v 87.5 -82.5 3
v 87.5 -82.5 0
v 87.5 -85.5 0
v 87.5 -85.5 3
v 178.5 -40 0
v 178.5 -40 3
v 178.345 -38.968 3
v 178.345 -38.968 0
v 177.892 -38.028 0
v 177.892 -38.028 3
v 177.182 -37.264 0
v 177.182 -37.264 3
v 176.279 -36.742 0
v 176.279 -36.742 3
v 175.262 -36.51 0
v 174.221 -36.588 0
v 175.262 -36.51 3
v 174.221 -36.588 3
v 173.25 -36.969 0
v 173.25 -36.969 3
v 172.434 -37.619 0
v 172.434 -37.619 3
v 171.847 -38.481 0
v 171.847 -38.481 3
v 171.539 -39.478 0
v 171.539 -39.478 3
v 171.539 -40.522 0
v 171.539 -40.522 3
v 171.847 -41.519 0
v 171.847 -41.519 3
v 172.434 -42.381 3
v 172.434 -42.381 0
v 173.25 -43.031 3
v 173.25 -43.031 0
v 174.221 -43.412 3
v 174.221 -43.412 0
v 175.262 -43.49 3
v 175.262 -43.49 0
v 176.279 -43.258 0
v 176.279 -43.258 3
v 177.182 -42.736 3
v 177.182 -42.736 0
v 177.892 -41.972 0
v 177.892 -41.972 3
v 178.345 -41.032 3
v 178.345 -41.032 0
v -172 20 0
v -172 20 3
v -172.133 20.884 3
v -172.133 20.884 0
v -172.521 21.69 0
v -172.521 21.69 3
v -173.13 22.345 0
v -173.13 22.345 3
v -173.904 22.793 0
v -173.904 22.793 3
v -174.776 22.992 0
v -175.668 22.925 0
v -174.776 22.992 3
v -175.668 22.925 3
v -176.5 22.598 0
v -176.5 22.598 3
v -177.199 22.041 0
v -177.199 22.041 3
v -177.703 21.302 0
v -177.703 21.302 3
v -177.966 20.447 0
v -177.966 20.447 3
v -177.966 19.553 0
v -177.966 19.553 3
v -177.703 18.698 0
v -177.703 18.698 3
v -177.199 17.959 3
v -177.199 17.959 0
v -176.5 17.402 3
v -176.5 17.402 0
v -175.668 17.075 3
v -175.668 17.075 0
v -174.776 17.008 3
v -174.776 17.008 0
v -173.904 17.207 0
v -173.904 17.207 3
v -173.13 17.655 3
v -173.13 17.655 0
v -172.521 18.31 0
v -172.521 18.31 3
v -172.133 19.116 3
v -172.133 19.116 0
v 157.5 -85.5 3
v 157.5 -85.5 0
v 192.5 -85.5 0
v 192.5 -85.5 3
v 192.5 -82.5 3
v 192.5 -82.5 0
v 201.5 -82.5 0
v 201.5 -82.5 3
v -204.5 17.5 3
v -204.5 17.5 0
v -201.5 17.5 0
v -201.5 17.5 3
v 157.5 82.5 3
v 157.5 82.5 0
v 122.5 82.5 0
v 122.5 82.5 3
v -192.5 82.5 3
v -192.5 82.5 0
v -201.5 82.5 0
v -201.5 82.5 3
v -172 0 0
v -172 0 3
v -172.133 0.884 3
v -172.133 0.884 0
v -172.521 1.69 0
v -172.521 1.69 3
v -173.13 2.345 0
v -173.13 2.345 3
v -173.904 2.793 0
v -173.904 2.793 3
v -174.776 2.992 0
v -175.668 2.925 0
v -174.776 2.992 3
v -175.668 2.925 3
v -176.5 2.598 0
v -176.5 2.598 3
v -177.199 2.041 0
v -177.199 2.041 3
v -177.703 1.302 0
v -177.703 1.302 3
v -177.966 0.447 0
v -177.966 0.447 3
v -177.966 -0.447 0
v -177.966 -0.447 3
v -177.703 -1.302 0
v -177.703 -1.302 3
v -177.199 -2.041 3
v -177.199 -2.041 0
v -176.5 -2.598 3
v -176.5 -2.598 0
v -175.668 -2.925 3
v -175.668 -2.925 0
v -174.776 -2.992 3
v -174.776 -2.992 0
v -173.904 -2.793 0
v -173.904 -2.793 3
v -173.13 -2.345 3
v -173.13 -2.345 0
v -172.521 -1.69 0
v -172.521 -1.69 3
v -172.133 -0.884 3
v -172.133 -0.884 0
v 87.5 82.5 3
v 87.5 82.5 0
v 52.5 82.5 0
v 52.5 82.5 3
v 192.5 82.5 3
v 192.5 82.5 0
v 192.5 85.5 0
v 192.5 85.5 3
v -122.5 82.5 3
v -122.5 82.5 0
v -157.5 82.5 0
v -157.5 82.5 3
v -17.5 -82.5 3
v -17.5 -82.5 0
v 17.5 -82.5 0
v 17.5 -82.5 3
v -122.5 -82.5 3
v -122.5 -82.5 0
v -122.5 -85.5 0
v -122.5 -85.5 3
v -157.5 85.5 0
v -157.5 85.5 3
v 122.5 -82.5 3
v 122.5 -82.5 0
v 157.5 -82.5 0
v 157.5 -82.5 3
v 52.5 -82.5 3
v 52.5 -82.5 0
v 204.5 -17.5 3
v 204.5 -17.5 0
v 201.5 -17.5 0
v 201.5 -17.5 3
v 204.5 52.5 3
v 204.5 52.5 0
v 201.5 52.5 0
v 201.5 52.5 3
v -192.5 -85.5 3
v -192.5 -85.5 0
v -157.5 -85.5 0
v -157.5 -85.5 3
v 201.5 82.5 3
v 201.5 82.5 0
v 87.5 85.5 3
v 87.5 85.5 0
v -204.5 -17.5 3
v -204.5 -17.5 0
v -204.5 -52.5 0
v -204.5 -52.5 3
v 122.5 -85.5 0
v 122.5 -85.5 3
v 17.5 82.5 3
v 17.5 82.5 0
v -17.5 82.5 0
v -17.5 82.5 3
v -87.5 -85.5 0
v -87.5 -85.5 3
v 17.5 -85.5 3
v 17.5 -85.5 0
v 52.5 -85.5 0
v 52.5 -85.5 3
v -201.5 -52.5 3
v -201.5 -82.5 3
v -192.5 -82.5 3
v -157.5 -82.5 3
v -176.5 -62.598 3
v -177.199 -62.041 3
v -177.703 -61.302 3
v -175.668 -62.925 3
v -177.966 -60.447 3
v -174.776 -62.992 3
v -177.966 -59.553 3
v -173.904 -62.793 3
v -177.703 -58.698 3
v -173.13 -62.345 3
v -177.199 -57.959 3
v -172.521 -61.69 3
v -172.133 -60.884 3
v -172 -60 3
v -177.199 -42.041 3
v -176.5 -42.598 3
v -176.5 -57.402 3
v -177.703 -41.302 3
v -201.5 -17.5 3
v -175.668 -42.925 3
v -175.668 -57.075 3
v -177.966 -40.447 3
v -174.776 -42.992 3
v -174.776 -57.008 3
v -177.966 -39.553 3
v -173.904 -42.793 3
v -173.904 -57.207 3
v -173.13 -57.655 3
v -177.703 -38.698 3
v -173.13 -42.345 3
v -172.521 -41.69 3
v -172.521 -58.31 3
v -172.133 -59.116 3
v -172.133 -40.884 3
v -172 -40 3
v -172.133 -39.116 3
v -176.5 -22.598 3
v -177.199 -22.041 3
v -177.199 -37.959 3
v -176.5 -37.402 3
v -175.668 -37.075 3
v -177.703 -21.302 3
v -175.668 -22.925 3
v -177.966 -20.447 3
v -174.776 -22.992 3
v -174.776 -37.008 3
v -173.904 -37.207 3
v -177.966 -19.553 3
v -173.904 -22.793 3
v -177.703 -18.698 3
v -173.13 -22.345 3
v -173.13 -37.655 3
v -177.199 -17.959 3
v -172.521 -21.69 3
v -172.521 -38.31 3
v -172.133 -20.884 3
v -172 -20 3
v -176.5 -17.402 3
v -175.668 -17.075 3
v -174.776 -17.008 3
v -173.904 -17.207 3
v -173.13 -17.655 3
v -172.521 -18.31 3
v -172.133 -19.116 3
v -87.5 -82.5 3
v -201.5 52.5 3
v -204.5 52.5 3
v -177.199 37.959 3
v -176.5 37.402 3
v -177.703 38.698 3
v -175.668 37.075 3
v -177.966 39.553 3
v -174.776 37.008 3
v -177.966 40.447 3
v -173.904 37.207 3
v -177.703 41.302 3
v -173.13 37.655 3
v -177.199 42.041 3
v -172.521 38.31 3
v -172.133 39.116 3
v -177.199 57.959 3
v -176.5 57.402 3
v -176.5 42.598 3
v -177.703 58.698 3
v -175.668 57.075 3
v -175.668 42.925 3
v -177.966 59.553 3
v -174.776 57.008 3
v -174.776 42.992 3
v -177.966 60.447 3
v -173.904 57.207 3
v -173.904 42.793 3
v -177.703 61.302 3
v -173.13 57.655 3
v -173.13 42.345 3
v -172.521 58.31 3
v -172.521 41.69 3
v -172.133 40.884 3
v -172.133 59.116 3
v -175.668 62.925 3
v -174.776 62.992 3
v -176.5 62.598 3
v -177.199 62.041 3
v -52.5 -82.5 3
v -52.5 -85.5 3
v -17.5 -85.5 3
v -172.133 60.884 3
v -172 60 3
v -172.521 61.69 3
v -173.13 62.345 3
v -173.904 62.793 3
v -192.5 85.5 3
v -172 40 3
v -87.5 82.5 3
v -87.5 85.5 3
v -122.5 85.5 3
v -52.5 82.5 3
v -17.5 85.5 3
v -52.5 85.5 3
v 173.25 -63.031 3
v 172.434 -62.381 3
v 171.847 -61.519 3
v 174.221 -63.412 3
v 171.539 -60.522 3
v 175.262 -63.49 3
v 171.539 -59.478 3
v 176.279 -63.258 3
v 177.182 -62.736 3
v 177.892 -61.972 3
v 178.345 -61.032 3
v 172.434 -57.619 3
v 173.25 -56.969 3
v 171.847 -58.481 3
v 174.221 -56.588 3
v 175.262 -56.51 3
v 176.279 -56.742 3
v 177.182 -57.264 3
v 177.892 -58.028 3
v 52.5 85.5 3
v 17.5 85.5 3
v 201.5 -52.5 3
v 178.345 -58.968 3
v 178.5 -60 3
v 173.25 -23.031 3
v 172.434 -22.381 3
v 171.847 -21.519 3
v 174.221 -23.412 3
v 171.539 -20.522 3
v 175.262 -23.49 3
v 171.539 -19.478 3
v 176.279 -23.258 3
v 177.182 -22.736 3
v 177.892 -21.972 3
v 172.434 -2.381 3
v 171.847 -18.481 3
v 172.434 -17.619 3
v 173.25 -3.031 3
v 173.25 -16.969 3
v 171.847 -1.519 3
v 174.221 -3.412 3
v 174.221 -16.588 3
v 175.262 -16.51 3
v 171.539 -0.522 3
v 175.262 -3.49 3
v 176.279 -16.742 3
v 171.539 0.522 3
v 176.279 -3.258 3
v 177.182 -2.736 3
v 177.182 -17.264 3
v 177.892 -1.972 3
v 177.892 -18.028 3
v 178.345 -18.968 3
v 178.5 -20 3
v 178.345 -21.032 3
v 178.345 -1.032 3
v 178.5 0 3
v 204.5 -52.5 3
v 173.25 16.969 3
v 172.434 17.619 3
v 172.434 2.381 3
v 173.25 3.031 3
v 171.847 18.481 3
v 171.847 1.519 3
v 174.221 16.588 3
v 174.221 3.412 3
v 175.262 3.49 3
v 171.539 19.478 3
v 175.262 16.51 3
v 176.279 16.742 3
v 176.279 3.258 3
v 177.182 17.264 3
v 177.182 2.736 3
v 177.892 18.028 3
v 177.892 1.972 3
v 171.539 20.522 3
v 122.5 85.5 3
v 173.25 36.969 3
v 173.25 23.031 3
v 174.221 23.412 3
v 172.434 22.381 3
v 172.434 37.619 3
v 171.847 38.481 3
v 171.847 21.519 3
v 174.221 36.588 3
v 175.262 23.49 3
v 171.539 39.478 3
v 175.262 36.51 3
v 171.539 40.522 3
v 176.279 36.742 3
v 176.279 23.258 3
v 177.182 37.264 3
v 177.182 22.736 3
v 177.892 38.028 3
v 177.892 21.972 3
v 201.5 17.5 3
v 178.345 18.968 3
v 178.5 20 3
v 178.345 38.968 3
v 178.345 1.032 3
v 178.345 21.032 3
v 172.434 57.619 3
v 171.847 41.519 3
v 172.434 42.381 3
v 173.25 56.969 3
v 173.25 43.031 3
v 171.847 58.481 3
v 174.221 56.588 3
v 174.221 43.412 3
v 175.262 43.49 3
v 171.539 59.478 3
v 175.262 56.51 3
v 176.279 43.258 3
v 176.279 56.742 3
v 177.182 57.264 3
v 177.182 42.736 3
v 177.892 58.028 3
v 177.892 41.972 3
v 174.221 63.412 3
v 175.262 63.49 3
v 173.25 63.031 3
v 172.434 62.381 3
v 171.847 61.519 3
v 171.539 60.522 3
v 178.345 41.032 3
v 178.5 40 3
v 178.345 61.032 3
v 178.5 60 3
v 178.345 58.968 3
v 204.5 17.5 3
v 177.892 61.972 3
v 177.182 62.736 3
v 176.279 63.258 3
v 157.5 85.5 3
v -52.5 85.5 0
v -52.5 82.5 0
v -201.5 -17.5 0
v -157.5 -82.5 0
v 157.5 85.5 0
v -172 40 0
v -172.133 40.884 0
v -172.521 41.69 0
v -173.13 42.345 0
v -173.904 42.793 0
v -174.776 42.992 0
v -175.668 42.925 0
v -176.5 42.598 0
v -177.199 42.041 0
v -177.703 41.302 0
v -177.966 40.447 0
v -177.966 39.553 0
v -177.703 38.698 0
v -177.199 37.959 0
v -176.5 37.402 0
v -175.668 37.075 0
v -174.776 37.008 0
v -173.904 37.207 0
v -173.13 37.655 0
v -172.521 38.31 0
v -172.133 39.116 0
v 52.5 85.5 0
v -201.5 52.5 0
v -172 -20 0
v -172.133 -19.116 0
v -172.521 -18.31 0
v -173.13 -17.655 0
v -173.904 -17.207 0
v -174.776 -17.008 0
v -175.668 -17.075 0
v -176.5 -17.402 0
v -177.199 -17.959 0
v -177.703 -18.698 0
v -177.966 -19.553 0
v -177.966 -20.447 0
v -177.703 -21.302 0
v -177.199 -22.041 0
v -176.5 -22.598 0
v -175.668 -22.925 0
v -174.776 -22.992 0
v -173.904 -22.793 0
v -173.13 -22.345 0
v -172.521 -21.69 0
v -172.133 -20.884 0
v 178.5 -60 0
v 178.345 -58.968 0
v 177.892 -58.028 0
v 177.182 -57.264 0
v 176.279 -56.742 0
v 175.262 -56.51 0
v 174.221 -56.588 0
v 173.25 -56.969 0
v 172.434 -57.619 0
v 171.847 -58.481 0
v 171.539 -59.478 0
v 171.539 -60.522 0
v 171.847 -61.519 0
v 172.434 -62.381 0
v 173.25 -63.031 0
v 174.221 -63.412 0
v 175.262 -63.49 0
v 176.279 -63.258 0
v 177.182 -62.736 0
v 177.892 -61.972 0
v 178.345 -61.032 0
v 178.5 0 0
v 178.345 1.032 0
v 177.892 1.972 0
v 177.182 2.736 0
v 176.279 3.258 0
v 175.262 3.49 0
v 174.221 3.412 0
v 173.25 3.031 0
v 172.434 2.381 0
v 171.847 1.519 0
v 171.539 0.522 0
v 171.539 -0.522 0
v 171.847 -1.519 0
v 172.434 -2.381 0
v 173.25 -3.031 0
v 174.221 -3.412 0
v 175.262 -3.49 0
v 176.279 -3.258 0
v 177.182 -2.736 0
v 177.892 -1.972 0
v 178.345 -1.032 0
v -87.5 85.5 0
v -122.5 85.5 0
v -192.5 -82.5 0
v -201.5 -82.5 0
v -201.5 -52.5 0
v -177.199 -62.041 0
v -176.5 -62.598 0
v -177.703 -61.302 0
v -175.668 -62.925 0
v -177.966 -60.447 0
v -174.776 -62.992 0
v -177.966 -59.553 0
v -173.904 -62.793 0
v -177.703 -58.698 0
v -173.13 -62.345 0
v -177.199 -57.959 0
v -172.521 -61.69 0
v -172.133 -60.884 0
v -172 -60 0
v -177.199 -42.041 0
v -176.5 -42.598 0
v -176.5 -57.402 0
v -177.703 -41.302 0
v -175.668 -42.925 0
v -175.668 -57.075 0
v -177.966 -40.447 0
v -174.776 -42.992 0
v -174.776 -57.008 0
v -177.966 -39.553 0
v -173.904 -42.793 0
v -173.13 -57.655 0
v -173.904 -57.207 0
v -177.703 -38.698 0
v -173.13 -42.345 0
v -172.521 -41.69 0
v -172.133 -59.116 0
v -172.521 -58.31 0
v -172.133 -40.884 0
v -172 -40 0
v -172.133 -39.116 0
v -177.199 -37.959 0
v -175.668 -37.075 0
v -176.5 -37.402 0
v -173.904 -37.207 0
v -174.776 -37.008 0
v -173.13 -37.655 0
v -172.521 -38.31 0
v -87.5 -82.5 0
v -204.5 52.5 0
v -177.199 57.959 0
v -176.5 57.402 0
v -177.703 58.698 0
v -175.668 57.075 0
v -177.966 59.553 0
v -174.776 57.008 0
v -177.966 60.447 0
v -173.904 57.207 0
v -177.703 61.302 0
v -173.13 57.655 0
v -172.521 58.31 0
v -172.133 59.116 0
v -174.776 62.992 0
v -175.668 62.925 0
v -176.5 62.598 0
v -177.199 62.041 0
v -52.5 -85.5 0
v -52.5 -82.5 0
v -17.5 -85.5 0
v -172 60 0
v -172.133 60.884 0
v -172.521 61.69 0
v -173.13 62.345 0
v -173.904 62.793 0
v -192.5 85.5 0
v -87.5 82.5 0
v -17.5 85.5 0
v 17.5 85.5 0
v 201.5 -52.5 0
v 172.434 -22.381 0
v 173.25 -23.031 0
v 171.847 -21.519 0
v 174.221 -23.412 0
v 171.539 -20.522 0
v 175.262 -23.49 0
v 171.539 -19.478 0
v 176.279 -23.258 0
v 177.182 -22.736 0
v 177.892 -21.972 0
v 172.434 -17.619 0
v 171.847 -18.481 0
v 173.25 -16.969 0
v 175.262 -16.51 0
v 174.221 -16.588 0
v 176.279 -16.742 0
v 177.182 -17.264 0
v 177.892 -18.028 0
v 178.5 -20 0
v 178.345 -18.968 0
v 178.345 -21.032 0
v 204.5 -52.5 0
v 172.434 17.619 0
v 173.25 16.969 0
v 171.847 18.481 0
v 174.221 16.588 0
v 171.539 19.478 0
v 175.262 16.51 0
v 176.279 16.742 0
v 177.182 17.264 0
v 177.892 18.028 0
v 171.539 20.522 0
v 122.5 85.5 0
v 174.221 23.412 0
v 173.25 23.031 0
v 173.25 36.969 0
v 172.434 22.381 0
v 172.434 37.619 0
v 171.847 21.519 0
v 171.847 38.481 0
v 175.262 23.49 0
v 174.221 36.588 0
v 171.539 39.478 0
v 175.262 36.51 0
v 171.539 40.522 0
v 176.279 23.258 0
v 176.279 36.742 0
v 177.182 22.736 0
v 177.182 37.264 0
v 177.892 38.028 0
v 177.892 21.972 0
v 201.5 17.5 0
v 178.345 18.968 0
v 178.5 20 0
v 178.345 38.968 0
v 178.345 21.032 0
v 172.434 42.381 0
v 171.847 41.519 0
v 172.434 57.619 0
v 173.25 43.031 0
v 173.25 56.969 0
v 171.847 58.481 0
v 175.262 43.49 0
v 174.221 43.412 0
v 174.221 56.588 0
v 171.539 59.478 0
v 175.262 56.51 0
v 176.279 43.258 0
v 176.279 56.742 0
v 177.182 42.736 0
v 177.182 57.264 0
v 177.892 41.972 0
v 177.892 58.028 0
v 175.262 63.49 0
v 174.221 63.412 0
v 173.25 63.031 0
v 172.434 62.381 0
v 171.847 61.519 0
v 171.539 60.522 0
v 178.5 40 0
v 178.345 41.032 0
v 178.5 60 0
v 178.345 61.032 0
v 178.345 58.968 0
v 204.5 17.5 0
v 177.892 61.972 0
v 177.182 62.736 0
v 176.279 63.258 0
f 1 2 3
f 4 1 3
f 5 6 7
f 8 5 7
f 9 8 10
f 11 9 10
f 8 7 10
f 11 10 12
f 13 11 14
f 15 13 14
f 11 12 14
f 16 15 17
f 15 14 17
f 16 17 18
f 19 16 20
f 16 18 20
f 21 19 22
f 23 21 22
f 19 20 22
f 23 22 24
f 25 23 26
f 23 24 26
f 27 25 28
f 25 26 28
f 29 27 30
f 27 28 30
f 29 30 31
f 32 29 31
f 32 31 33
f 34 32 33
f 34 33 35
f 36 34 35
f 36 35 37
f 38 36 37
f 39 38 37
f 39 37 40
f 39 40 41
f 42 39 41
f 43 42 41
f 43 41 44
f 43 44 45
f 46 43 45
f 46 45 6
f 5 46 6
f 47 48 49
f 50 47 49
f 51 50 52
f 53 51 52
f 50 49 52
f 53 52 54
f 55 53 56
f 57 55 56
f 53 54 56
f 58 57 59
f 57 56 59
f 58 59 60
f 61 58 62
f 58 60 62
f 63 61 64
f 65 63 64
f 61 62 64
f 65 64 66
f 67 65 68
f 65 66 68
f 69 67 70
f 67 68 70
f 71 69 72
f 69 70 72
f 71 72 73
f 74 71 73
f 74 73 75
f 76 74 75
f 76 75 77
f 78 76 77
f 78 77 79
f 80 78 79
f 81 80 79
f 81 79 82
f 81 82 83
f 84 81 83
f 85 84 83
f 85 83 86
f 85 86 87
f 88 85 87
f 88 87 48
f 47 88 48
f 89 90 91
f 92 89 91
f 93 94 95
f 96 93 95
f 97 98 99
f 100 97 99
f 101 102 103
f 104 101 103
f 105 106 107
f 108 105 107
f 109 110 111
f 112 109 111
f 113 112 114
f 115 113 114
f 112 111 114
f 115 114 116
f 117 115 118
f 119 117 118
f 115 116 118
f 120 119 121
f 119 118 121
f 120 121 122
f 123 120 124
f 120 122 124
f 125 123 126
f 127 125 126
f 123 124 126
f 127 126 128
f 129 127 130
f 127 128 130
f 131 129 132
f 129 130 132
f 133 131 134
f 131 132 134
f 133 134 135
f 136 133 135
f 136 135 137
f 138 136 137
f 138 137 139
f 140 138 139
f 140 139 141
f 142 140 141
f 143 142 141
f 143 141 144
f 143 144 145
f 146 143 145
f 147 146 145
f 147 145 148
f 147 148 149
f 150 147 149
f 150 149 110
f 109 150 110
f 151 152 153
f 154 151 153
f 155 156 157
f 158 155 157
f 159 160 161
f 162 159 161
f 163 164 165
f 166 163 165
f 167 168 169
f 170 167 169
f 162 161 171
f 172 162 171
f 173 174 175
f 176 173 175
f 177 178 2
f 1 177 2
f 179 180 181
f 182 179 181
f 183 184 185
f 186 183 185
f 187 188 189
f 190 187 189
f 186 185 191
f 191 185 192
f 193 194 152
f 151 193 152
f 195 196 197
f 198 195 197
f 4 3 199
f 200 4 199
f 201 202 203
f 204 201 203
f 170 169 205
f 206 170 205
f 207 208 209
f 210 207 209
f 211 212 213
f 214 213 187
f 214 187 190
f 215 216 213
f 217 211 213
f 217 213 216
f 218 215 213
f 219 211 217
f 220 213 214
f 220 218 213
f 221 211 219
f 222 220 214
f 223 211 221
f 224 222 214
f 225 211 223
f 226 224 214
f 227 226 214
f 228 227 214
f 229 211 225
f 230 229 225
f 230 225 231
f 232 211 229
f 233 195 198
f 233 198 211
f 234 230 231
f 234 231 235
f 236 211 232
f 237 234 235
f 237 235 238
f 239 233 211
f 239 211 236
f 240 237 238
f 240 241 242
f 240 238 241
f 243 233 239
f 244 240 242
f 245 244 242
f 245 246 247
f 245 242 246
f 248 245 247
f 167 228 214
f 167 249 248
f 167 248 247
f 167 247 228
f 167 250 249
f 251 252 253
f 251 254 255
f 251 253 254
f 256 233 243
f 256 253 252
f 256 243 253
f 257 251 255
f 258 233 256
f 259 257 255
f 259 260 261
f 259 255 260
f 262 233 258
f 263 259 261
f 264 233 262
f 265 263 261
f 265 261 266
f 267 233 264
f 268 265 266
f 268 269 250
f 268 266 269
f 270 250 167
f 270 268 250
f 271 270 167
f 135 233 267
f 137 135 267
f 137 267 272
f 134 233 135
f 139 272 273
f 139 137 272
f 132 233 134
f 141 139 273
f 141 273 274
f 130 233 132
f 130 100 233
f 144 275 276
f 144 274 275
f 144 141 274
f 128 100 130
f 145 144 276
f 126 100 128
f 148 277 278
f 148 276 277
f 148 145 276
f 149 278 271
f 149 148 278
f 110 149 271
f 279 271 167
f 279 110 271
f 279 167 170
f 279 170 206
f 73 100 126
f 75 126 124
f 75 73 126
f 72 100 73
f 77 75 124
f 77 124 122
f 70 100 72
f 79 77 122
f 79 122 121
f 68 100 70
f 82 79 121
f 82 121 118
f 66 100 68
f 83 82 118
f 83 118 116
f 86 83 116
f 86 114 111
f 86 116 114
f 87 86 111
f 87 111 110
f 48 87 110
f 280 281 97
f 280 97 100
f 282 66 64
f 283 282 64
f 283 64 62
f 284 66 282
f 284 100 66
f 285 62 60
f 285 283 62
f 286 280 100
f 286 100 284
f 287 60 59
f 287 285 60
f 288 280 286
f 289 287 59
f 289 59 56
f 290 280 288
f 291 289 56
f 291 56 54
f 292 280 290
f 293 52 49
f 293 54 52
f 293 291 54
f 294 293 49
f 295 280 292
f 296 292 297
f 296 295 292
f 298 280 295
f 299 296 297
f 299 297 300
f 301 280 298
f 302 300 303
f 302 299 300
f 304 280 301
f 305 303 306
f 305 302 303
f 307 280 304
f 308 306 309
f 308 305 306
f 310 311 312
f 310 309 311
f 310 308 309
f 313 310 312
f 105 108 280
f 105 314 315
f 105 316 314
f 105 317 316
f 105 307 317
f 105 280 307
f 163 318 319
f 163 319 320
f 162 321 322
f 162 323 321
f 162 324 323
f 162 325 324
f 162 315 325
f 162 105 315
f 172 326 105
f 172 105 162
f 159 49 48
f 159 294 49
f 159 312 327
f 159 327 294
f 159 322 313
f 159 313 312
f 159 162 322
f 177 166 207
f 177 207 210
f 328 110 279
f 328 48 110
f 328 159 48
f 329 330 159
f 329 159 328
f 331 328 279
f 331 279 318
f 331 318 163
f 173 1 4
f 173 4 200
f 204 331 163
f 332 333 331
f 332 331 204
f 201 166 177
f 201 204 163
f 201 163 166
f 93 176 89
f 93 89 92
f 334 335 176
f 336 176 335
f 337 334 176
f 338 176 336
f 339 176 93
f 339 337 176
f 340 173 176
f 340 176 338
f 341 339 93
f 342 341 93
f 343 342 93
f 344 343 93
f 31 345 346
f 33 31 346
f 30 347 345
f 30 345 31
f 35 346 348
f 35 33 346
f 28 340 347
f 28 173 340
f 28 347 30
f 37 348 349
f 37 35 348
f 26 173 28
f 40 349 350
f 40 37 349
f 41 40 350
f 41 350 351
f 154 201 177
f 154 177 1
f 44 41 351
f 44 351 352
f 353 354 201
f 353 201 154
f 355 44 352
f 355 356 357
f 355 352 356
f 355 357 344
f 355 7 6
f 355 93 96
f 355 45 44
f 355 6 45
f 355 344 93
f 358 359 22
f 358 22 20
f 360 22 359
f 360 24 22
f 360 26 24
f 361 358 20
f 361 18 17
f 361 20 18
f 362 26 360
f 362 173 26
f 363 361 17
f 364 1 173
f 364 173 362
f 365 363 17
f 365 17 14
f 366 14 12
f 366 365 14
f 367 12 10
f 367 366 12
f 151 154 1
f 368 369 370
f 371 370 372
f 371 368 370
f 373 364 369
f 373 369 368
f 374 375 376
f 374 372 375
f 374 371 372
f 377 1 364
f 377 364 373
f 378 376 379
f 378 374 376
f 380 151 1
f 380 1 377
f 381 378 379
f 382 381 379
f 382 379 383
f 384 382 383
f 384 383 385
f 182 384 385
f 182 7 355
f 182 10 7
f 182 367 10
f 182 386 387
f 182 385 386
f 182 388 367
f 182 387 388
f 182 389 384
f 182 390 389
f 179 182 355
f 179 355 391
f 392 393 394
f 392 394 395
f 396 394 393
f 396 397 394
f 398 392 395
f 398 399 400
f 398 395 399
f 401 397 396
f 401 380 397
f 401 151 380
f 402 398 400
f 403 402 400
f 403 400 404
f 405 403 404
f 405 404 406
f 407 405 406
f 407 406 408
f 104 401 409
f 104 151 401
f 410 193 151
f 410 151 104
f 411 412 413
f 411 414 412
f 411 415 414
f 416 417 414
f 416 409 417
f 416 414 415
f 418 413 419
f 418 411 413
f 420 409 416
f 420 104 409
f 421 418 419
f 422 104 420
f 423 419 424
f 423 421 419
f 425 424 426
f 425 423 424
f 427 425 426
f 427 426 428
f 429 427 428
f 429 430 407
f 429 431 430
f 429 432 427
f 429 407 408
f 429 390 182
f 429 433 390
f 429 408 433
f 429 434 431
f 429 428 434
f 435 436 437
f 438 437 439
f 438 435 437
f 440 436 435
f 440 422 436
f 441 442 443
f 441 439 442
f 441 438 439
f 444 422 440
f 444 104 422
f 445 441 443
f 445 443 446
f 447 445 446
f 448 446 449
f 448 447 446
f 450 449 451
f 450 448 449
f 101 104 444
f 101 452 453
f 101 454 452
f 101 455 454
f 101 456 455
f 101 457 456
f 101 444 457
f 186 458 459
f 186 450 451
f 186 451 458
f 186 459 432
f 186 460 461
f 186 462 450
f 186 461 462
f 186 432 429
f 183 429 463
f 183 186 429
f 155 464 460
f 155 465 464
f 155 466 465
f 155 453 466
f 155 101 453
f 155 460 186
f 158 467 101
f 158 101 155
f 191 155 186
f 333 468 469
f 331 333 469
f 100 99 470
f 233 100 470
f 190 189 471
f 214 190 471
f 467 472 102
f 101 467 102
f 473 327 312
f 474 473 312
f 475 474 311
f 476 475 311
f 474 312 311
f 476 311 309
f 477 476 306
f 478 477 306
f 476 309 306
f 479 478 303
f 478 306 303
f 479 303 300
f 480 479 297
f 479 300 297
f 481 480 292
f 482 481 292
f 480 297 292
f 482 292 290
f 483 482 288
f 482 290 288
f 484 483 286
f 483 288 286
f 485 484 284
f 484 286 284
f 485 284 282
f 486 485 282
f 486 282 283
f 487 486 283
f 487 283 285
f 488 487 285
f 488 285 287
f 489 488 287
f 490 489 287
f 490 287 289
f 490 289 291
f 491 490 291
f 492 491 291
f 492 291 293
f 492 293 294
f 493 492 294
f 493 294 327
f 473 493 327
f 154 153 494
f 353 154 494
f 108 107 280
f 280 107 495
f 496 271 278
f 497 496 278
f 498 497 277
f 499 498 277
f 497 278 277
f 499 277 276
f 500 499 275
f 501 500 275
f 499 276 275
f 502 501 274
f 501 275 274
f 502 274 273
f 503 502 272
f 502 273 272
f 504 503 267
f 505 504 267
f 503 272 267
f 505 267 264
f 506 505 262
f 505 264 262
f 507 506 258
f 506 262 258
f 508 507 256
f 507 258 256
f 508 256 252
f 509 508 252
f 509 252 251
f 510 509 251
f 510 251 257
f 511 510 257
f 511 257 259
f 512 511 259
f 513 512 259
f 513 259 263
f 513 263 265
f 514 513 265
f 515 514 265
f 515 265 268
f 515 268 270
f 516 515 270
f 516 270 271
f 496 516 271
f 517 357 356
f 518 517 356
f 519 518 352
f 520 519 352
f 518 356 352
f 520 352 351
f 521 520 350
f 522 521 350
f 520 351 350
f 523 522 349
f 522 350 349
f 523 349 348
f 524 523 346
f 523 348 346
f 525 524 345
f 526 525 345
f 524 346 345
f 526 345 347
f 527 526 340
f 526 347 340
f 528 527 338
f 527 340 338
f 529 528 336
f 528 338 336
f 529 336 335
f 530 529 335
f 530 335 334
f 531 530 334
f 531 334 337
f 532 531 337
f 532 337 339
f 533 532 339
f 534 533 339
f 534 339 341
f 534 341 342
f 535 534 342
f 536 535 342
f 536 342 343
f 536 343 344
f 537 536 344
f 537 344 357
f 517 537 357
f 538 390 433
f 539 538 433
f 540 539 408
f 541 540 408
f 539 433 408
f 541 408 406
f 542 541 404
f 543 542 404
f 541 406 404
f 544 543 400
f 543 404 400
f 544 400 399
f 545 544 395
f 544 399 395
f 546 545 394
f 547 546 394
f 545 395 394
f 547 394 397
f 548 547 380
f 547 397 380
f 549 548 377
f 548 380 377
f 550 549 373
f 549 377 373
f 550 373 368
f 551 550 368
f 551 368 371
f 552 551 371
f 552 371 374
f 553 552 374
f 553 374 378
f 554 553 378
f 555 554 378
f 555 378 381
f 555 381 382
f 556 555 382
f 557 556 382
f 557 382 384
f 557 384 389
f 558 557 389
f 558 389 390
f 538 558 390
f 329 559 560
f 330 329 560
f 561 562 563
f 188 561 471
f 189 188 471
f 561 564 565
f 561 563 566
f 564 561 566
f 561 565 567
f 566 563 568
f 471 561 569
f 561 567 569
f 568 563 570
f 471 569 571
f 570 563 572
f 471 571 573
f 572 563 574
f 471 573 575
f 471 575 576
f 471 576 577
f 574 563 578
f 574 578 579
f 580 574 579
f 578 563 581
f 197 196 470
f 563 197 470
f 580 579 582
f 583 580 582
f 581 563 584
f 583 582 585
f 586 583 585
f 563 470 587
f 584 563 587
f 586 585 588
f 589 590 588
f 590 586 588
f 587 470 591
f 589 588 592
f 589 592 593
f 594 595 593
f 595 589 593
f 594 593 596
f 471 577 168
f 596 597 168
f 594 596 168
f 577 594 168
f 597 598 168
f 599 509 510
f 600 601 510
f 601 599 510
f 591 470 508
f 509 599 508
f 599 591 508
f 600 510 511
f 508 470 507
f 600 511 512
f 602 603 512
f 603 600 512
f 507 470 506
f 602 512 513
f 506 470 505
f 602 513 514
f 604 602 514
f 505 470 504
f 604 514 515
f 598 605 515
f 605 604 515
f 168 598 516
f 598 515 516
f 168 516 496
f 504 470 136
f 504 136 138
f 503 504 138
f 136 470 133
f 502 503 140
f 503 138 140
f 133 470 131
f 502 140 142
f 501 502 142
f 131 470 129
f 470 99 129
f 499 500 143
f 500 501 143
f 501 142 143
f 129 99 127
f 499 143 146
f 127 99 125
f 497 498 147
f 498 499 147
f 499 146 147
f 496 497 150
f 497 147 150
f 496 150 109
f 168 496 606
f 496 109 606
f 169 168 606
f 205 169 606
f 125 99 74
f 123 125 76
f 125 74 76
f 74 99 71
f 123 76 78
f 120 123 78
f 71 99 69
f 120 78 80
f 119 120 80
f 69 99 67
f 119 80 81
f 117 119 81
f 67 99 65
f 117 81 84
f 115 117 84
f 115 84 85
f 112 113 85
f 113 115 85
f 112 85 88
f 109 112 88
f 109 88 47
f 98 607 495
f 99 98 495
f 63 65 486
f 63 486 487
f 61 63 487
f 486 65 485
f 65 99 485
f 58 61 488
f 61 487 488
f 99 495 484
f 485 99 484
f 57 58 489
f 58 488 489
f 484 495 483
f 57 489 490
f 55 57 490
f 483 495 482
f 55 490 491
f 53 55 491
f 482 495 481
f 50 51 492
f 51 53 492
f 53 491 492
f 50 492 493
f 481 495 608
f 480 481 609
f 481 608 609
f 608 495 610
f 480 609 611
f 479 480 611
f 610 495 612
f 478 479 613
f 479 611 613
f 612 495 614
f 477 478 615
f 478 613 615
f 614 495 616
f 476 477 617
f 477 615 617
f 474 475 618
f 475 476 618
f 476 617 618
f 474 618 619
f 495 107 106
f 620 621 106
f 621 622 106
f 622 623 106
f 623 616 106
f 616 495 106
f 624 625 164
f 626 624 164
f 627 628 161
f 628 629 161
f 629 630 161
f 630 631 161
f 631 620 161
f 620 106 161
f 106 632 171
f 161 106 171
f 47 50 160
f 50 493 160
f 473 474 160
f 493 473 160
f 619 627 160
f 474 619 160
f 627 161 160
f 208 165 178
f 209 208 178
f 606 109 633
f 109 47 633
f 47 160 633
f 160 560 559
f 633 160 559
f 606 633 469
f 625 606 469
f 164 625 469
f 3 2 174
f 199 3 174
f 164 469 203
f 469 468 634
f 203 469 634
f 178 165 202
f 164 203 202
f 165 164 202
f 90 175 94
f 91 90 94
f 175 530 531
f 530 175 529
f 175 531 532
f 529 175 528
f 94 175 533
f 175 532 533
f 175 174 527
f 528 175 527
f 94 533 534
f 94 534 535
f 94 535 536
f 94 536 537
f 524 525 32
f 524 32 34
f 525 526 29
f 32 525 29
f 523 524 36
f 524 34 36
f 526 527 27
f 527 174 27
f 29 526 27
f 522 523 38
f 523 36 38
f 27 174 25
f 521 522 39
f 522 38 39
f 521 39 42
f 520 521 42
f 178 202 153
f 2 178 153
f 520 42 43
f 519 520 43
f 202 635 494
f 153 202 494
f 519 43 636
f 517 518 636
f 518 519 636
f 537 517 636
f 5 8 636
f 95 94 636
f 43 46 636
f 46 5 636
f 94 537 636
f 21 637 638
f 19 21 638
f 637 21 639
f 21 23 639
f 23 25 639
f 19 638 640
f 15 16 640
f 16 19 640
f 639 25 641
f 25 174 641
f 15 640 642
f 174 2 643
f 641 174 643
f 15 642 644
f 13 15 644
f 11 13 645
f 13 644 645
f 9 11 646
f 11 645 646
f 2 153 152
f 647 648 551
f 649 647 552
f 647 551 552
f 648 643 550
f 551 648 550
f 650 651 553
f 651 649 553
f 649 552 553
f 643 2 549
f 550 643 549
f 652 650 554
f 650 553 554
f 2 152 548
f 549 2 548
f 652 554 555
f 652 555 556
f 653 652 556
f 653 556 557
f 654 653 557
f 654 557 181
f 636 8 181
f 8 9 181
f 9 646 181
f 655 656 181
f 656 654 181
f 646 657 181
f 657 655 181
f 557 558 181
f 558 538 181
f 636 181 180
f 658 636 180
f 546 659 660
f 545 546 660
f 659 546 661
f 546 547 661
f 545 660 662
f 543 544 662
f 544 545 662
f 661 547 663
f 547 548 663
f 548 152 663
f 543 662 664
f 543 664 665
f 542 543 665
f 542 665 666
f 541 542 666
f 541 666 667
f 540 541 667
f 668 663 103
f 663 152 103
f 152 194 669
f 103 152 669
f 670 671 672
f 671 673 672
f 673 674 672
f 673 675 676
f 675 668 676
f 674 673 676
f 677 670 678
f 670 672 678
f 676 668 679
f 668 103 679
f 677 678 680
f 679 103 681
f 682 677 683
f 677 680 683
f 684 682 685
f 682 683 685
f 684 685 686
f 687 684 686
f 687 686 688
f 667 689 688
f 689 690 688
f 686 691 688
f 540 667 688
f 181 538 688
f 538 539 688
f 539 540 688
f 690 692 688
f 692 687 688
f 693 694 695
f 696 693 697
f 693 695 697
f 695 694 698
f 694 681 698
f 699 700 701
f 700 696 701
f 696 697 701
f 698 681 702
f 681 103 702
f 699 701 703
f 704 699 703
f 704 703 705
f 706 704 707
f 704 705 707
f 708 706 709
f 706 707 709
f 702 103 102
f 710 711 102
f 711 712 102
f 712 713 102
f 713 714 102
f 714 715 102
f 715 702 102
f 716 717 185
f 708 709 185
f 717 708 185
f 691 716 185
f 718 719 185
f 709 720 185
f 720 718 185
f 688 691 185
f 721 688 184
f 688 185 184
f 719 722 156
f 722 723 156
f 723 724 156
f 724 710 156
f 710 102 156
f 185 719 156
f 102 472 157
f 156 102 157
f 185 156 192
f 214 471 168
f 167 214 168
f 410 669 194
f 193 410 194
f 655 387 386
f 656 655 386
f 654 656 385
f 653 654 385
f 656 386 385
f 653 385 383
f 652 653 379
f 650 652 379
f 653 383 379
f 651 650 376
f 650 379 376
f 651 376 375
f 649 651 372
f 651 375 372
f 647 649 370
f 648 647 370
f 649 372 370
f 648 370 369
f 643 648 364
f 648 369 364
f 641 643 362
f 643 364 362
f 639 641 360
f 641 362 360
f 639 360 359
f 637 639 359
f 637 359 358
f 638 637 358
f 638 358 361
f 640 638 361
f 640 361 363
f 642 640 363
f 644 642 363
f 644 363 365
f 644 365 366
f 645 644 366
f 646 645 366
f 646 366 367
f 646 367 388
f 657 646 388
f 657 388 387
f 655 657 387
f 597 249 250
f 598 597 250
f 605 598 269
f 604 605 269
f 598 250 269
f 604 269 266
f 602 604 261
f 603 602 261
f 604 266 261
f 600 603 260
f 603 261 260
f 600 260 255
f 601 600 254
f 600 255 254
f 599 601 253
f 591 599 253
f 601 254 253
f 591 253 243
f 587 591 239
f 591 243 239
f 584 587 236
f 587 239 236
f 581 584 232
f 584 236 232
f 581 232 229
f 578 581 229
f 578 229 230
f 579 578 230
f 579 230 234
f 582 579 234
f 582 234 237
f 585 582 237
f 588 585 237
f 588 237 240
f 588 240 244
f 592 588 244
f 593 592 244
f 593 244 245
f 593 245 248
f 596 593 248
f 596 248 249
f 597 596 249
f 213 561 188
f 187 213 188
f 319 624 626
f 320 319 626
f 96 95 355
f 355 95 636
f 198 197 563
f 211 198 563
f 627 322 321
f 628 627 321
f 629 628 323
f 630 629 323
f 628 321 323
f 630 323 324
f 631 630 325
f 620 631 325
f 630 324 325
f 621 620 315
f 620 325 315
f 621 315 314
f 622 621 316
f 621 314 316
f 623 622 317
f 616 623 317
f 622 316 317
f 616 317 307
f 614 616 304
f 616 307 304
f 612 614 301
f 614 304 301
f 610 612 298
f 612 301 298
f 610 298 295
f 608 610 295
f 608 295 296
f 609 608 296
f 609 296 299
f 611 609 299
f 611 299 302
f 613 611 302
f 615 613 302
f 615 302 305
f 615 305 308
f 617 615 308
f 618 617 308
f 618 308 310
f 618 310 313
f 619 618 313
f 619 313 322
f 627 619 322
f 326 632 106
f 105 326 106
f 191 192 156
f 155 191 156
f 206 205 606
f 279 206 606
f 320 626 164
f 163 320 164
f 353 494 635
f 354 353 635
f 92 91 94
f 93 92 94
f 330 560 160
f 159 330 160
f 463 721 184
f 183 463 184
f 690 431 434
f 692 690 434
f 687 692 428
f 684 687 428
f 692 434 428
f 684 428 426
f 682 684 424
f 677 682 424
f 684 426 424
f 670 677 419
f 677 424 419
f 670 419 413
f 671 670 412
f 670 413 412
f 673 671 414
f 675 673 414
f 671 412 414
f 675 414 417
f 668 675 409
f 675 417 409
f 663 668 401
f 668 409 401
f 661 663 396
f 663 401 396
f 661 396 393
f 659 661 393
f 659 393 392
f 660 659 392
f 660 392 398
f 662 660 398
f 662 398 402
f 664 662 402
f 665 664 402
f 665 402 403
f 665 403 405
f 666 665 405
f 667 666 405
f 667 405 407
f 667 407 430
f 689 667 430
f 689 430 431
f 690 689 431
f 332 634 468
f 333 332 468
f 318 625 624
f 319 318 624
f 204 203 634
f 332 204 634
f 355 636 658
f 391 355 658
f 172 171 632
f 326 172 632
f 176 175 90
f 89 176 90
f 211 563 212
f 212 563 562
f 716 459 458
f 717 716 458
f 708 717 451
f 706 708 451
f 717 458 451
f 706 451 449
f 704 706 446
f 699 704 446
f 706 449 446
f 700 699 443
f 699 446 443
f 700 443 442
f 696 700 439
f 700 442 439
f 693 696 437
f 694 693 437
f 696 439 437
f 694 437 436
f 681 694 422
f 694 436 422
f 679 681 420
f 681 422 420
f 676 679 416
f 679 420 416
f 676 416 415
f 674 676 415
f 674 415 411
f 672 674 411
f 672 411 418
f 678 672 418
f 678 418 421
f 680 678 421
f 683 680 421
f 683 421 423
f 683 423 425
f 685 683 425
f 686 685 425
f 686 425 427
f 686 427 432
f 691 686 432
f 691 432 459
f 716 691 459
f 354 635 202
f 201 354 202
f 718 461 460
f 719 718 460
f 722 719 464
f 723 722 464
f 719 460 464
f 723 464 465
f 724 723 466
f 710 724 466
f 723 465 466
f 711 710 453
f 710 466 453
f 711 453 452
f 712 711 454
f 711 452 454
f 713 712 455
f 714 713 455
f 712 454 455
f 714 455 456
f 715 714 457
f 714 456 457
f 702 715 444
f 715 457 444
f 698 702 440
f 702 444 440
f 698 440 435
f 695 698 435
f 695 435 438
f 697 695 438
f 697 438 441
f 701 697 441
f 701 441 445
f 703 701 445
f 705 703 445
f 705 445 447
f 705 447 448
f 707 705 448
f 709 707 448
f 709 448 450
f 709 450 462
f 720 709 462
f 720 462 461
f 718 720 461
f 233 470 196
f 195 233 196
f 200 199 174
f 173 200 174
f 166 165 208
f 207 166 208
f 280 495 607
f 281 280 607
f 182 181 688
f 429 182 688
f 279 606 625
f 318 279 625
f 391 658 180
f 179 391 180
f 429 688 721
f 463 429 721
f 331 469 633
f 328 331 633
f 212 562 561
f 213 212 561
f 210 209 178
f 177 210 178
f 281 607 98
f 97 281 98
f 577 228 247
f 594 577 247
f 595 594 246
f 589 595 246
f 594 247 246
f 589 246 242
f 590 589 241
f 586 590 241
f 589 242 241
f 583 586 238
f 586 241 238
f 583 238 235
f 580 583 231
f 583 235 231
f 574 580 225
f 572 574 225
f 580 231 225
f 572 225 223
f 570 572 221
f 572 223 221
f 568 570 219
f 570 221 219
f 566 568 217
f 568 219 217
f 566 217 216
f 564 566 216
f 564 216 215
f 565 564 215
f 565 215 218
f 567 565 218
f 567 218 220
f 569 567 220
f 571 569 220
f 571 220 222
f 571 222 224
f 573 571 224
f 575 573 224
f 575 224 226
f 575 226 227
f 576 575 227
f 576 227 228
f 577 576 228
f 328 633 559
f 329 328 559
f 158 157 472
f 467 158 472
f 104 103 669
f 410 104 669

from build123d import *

# Parameters (mm, degrees)
BOSS_EXTRUDE1_DEPTH = 3
SKETCH1_R           = 3
SKETCH1_R_2         = 3.5
CUT_EXTRUDE1_DEPTH  = 222.674310645


with BuildPart() as part:
    # Model → Boss-Extrude1 (new body)
    with BuildSketch(Plane.XY):
        Polygon((192.5, 85.5), (157.5, 85.5), (157.5, 82.5), (122.5, 82.5), (122.5, 85.5), (87.5, 85.5), (87.5, 82.5), (52.5, 82.5), (52.5, 85.5), (17.5, 85.5), (17.5, 82.5), (-17.5, 82.5), (-17.5, 85.5), (-52.5, 85.5), (-52.5, 82.5), (-87.5, 82.5), (-87.5, 85.5), (-122.5, 85.5), (-122.5, 82.5), (-157.5, 82.5), (-157.5, 85.5), (-192.5, 85.5), (-192.5, 82.5), (-201.5, 82.5), (-201.5, 52.5), (-204.5, 52.5), (-204.5, 17.5), (-201.5, 17.5), (-201.5, -17.5), (-204.5, -17.5), (-204.5, -52.5), (-201.5, -52.5), (-201.5, -82.5), (-192.5, -82.5), (-192.5, -85.5), (-157.5, -85.5), (-157.5, -82.5), (-122.5, -82.5), (-122.5, -85.5), (-87.5, -85.5), (-87.5, -82.5), (-52.5, -82.5), (-52.5, -85.5), (-17.5, -85.5), (-17.5, -82.5), (17.5, -82.5), (17.5, -85.5), (52.5, -85.5), (52.5, -82.5), (87.5, -82.5), (87.5, -85.5), (122.5, -85.5), (122.5, -82.5), (157.5, -82.5), (157.5, -85.5), (192.5, -85.5), (192.5, -82.5), (201.5, -82.5), (201.5, -52.5), (204.5, -52.5), (204.5, -17.5), (201.5, -17.5), (201.5, 17.5), (204.5, 17.5), (204.5, 52.5), (201.5, 52.5), (201.5, 82.5), (192.5, 82.5), align=None)
    extrude(amount=BOSS_EXTRUDE1_DEPTH)

    # Sketch1 → Cut-Extrude1 (cut, through all)
    with BuildSketch(Plane.XY.offset(3)):
        with Locations((-175, 0)):
            Circle(SKETCH1_R)
        with Locations((175, 0)):
            Circle(SKETCH1_R_2)
        with Locations((-175, 20)):
            Circle(SKETCH1_R)
        with Locations((175, 20)):
            Circle(SKETCH1_R_2)
        with Locations((-175, 40)):
            Circle(SKETCH1_R)
        with Locations((175, 40)):
            Circle(SKETCH1_R_2)
        with Locations((-175, 60)):
            Circle(SKETCH1_R)
        with Locations((175, 60)):
            Circle(SKETCH1_R_2)
        with Locations((-175, -20)):
            Circle(SKETCH1_R)
        with Locations((175, -20)):
            Circle(SKETCH1_R_2)
        with Locations((-175, -40)):
            Circle(SKETCH1_R)
        with Locations((175, -40)):
            Circle(SKETCH1_R_2)
        with Locations((-175, -60)):
            Circle(SKETCH1_R)
        with Locations((175, -60)):
            Circle(SKETCH1_R_2)
    extrude(amount=-CUT_EXTRUDE1_DEPTH, mode=Mode.SUBTRACT)


solid = part.part
